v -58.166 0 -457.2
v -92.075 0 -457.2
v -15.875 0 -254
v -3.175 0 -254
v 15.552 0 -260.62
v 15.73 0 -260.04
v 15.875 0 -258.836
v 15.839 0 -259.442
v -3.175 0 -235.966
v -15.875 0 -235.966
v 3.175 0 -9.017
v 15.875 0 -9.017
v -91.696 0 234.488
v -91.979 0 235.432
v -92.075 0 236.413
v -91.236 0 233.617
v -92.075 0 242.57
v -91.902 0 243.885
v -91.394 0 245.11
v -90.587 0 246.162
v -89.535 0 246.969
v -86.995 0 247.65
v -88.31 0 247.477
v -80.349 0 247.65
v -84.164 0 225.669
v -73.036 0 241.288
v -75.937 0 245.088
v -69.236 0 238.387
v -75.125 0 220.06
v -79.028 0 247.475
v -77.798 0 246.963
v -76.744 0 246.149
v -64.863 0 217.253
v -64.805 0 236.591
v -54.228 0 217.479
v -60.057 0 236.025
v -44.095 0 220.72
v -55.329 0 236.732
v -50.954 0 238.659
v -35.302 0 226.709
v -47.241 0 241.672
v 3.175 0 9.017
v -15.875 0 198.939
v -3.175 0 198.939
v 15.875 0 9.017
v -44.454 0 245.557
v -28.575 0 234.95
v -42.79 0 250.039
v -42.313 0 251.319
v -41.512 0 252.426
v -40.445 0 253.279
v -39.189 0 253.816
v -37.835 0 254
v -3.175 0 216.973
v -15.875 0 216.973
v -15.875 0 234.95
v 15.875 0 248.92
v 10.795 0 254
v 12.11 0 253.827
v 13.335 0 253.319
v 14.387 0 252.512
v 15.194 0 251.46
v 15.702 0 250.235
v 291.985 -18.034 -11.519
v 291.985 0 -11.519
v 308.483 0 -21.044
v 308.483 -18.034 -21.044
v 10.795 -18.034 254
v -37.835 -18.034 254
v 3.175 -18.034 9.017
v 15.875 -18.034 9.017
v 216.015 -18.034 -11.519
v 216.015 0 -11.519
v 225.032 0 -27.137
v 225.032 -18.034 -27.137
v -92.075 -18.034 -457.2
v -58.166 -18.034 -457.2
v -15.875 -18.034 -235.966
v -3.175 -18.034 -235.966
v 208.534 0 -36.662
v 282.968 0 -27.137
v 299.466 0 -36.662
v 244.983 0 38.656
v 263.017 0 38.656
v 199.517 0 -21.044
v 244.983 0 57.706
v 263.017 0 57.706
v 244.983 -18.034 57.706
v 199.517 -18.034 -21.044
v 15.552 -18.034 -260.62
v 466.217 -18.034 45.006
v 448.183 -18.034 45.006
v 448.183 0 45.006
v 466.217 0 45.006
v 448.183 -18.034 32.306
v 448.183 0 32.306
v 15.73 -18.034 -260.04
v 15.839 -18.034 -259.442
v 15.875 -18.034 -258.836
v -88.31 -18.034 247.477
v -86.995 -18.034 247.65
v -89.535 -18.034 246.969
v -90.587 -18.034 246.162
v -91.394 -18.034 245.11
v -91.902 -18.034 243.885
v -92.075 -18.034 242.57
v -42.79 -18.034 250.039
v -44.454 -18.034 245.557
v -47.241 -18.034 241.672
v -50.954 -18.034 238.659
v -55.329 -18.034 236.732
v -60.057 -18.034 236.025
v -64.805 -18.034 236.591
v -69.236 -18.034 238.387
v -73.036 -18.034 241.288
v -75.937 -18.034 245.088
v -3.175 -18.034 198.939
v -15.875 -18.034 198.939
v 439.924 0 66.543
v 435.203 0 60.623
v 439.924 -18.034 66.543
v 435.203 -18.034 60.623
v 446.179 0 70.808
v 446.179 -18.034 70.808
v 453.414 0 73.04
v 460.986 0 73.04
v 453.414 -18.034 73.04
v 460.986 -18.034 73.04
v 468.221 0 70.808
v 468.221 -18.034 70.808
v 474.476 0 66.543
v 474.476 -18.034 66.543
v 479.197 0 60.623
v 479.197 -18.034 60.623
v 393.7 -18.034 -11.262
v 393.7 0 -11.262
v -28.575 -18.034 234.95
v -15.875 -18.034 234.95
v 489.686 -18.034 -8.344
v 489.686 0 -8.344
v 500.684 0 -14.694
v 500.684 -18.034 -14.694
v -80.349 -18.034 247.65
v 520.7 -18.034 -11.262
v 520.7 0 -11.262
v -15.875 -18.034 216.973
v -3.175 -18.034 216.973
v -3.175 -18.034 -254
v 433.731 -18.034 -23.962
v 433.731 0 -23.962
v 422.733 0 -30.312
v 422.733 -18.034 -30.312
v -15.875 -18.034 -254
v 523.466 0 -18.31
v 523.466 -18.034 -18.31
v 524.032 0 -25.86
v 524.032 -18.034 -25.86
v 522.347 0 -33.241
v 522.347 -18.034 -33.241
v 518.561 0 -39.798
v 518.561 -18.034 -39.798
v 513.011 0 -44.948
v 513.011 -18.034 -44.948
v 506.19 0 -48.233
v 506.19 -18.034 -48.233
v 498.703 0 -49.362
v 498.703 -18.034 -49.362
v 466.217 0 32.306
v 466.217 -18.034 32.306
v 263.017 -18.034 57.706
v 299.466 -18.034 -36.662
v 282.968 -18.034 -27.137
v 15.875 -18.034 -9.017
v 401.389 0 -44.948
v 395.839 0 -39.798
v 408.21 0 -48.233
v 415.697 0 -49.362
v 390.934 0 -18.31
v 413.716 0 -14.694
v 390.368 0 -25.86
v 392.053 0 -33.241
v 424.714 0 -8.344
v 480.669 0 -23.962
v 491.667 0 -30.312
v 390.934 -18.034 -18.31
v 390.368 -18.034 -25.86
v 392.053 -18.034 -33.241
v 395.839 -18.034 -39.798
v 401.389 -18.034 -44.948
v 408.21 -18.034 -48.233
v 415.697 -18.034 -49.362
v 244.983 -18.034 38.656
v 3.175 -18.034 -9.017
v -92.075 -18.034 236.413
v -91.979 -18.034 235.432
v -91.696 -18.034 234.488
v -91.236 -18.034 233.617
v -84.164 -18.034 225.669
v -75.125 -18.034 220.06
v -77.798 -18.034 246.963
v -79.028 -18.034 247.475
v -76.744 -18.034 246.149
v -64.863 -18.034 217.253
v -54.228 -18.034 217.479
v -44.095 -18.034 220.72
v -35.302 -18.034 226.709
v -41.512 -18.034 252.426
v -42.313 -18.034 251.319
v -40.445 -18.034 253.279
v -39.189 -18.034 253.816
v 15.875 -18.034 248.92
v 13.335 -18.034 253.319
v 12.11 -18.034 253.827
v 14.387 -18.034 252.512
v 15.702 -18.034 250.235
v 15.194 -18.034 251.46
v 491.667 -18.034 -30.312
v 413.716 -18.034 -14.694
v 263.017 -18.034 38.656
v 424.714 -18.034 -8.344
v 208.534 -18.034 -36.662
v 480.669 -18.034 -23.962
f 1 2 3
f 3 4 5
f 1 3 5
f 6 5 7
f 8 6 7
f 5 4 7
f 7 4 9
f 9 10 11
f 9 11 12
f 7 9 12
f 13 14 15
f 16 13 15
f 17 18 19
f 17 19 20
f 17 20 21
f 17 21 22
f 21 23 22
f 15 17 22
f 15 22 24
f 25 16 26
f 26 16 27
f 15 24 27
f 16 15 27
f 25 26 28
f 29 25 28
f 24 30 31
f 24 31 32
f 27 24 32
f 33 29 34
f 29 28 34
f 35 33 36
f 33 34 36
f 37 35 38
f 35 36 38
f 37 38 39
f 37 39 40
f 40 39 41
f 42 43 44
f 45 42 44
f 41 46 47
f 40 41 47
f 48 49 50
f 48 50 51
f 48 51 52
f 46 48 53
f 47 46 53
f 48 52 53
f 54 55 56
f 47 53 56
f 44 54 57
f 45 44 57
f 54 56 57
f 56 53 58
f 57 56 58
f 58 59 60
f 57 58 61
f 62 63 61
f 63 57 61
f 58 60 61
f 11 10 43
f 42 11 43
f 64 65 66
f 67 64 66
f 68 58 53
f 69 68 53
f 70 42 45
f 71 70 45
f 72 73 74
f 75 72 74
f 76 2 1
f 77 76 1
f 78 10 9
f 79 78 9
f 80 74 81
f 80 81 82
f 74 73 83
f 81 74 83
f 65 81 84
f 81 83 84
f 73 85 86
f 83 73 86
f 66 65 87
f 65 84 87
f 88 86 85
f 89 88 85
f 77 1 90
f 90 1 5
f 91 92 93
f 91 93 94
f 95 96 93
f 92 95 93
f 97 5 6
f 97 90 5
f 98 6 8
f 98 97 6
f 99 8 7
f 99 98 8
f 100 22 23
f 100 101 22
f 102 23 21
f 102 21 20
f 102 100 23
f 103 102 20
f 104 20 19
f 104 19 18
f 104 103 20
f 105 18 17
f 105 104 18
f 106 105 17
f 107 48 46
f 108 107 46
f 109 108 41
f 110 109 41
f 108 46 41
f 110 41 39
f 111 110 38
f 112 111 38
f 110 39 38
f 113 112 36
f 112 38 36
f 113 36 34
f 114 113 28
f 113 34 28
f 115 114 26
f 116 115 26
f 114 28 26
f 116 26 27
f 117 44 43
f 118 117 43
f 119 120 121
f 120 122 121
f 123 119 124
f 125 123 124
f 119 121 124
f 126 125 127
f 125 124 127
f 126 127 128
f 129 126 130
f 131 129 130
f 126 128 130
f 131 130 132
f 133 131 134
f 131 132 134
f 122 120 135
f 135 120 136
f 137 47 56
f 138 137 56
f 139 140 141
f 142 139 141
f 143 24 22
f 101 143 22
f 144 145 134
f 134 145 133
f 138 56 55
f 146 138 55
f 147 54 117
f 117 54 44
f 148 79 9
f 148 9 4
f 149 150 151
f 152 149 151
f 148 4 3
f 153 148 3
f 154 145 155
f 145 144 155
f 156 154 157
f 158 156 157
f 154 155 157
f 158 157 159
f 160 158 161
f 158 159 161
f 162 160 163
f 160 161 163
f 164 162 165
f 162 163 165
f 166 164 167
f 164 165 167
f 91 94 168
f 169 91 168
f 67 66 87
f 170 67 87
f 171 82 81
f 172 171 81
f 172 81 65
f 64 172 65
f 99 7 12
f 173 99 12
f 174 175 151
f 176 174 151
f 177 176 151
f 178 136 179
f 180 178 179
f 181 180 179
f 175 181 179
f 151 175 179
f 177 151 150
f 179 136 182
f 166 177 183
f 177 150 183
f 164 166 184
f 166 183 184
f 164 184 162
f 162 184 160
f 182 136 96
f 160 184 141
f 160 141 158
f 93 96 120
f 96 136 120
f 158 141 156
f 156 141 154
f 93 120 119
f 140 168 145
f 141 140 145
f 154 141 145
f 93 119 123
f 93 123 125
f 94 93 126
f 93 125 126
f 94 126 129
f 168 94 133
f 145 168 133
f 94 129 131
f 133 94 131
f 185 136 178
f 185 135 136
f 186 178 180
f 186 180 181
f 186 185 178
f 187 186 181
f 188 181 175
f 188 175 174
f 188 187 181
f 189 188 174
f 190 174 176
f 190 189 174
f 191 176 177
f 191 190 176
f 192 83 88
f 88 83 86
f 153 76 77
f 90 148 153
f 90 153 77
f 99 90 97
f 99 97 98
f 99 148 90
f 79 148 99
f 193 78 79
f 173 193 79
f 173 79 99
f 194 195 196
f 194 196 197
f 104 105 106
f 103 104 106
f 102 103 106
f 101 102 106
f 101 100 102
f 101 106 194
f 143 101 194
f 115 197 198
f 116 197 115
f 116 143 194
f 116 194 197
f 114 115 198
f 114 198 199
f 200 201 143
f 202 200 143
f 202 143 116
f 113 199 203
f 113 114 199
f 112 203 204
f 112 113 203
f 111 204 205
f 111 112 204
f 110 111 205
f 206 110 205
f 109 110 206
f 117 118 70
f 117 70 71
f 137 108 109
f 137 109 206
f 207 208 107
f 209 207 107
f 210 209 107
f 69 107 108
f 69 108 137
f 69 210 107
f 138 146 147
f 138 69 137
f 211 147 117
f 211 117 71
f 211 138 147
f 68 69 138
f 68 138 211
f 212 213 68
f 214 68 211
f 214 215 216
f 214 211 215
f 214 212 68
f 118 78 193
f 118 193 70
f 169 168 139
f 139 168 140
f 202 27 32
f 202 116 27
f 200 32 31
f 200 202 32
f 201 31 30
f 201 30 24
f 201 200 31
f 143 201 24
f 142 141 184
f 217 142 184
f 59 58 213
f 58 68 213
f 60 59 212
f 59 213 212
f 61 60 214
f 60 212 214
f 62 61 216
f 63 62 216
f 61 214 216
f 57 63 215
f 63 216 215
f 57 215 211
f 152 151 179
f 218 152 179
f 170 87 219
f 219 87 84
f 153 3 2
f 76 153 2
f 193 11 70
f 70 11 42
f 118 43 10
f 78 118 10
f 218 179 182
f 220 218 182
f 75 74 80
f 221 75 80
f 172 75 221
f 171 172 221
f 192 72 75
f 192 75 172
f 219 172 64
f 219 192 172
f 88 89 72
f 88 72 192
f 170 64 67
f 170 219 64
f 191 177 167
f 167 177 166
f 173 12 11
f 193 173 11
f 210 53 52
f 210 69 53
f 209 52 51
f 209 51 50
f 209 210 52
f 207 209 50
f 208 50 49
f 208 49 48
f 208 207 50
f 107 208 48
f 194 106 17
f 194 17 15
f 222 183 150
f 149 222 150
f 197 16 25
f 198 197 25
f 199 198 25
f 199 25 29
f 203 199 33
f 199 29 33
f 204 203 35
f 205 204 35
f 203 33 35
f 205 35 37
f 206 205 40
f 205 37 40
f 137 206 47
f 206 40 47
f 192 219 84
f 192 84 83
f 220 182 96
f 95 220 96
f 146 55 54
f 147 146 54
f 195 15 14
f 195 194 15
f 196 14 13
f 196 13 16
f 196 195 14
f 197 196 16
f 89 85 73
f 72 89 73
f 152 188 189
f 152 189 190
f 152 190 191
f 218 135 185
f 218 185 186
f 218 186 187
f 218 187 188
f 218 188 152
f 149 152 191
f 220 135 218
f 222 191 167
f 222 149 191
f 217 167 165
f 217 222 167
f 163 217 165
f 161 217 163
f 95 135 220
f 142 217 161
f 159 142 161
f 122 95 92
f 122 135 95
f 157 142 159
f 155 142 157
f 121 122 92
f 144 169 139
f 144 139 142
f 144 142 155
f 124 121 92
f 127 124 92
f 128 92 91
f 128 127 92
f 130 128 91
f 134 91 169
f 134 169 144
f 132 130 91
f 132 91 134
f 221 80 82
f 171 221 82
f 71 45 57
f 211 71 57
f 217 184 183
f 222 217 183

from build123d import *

# Parameters (mm, degrees)
F2_DEPTH = 18.034
F1_W     = 12.7
F1_H     = 19.05
F3_R     = 25.4
F4_R     = 5.08


# Not quite as in the source:
# - a variable given as a bare number and used for a length is read in inches; the dataset says mm whatever the document's units were


with BuildPart() as f2:
    # F1 (on Front) → F2 (new body)
    with BuildSketch(Plane.XZ):
        Polygon((457.2, 98.7234841871), (371.7029547439, -49.3617420935), (542.6970452561, -49.3617420935), align=None)
        Polygon((448.183, 32.3055820552), (448.183, 45.0055820552), (466.217, 45.0055820552), (466.217, 32.3055820552), (489.6859547439, -8.3438399617), (500.6844773719, -14.6938399617), (491.6674773719, -30.3117420935), (480.6689547439, -23.9617420935), (433.7310452561, -23.9617420935), (422.7325226281, -30.3117420935), (413.7155226281, -14.6938399617), (424.7140452561, -8.3438399617), align=None, mode=Mode.SUBTRACT)
    extrude(amount=F2_DEPTH)

    # F3
    f3_edges = [f2.edges().sort_by_distance(p)[0] for p in [
        (457.2, -9.017, 98.723484),
        (542.697045, -9.017, -49.361742),
        (371.702955, -9.017, -49.361742),
    ]]
    fillet(f3_edges, radius=F3_R)


with BuildPart() as f2b:
    # F1 (on Front) → F2, piece 2 (new body)
    with BuildSketch(Plane.XZ):
        Polygon((308.483, -21.0438399617), (263.017, 57.7055820552), (263.017, 38.6555820552), (244.983, 38.6555820552), (244.983, 57.7055820552), (199.517, -21.0438399617), (216.0147839421, -11.5188399617), (225.0317839421, -27.1367420935), (208.534, -36.6617420935), (299.466, -36.6617420935), (282.9682160579, -27.1367420935), (291.9852160579, -11.5188399617), align=None)
    extrude(amount=F2_DEPTH)


with BuildPart() as f2c:
    # F1 (on Front) → F2, piece 3 (new body)
    with BuildSketch(Plane.XZ):
        Polygon((15.875, 254), (-15.875, 254), (-15.875, 234.95), (-15.875, 216.9734554677), (-3.175, 216.9734554677), (-3.175, 198.9394554677), (-15.875, 198.9394554677), (-15.875, -235.966), (-3.175, -235.966), (-3.175, -254), (-15.875, -254), (-92.075, -457.2), (-58.1659851358, -457.2), (15.875, -259.7573729713), (15.875, -9.017), (3.175, -9.017), (3.175, 0), (3.175, 9.017), (15.875, 9.017), align=None)
        with Locations((-22.225, 244.475)):
            Rectangle(F1_W, F1_H)
        with BuildLine():
            Line((-28.575, 234.95), (-28.575, 254))
            Line((-28.575, 254), (-42.3484554677, 254))
            ThreePointArc((-42.3484554677, 254), (-57.0975584537, 236.315549927), (-77.1426589727, 247.65))
            Line((-77.1426589727, 247.65), (-92.075, 247.65))
            Line((-92.075, 247.65), (-92.075, 234.95))
            ThreePointArc((-92.075, 234.95), (-60.325, 216.9734554677), (-28.575, 234.95))
        make_face()
    extrude(amount=F2_DEPTH)

    # F4
    f4_edges = [f2c.edges().sort_by_distance(p)[0] for p in [
        (15.875, -9.017, -259.757373),
        (15.875, -9.017, 254),
        (-42.348455, -9.017, 254),
        (-77.142659, -9.017, 247.65),
        (-92.075, -9.017, 247.65),
        (-92.075, -9.017, 234.95),
    ]]
    fillet(f4_edges, radius=F4_R)


solid = Compound([f2.part, f2b.part, f2c.part])
